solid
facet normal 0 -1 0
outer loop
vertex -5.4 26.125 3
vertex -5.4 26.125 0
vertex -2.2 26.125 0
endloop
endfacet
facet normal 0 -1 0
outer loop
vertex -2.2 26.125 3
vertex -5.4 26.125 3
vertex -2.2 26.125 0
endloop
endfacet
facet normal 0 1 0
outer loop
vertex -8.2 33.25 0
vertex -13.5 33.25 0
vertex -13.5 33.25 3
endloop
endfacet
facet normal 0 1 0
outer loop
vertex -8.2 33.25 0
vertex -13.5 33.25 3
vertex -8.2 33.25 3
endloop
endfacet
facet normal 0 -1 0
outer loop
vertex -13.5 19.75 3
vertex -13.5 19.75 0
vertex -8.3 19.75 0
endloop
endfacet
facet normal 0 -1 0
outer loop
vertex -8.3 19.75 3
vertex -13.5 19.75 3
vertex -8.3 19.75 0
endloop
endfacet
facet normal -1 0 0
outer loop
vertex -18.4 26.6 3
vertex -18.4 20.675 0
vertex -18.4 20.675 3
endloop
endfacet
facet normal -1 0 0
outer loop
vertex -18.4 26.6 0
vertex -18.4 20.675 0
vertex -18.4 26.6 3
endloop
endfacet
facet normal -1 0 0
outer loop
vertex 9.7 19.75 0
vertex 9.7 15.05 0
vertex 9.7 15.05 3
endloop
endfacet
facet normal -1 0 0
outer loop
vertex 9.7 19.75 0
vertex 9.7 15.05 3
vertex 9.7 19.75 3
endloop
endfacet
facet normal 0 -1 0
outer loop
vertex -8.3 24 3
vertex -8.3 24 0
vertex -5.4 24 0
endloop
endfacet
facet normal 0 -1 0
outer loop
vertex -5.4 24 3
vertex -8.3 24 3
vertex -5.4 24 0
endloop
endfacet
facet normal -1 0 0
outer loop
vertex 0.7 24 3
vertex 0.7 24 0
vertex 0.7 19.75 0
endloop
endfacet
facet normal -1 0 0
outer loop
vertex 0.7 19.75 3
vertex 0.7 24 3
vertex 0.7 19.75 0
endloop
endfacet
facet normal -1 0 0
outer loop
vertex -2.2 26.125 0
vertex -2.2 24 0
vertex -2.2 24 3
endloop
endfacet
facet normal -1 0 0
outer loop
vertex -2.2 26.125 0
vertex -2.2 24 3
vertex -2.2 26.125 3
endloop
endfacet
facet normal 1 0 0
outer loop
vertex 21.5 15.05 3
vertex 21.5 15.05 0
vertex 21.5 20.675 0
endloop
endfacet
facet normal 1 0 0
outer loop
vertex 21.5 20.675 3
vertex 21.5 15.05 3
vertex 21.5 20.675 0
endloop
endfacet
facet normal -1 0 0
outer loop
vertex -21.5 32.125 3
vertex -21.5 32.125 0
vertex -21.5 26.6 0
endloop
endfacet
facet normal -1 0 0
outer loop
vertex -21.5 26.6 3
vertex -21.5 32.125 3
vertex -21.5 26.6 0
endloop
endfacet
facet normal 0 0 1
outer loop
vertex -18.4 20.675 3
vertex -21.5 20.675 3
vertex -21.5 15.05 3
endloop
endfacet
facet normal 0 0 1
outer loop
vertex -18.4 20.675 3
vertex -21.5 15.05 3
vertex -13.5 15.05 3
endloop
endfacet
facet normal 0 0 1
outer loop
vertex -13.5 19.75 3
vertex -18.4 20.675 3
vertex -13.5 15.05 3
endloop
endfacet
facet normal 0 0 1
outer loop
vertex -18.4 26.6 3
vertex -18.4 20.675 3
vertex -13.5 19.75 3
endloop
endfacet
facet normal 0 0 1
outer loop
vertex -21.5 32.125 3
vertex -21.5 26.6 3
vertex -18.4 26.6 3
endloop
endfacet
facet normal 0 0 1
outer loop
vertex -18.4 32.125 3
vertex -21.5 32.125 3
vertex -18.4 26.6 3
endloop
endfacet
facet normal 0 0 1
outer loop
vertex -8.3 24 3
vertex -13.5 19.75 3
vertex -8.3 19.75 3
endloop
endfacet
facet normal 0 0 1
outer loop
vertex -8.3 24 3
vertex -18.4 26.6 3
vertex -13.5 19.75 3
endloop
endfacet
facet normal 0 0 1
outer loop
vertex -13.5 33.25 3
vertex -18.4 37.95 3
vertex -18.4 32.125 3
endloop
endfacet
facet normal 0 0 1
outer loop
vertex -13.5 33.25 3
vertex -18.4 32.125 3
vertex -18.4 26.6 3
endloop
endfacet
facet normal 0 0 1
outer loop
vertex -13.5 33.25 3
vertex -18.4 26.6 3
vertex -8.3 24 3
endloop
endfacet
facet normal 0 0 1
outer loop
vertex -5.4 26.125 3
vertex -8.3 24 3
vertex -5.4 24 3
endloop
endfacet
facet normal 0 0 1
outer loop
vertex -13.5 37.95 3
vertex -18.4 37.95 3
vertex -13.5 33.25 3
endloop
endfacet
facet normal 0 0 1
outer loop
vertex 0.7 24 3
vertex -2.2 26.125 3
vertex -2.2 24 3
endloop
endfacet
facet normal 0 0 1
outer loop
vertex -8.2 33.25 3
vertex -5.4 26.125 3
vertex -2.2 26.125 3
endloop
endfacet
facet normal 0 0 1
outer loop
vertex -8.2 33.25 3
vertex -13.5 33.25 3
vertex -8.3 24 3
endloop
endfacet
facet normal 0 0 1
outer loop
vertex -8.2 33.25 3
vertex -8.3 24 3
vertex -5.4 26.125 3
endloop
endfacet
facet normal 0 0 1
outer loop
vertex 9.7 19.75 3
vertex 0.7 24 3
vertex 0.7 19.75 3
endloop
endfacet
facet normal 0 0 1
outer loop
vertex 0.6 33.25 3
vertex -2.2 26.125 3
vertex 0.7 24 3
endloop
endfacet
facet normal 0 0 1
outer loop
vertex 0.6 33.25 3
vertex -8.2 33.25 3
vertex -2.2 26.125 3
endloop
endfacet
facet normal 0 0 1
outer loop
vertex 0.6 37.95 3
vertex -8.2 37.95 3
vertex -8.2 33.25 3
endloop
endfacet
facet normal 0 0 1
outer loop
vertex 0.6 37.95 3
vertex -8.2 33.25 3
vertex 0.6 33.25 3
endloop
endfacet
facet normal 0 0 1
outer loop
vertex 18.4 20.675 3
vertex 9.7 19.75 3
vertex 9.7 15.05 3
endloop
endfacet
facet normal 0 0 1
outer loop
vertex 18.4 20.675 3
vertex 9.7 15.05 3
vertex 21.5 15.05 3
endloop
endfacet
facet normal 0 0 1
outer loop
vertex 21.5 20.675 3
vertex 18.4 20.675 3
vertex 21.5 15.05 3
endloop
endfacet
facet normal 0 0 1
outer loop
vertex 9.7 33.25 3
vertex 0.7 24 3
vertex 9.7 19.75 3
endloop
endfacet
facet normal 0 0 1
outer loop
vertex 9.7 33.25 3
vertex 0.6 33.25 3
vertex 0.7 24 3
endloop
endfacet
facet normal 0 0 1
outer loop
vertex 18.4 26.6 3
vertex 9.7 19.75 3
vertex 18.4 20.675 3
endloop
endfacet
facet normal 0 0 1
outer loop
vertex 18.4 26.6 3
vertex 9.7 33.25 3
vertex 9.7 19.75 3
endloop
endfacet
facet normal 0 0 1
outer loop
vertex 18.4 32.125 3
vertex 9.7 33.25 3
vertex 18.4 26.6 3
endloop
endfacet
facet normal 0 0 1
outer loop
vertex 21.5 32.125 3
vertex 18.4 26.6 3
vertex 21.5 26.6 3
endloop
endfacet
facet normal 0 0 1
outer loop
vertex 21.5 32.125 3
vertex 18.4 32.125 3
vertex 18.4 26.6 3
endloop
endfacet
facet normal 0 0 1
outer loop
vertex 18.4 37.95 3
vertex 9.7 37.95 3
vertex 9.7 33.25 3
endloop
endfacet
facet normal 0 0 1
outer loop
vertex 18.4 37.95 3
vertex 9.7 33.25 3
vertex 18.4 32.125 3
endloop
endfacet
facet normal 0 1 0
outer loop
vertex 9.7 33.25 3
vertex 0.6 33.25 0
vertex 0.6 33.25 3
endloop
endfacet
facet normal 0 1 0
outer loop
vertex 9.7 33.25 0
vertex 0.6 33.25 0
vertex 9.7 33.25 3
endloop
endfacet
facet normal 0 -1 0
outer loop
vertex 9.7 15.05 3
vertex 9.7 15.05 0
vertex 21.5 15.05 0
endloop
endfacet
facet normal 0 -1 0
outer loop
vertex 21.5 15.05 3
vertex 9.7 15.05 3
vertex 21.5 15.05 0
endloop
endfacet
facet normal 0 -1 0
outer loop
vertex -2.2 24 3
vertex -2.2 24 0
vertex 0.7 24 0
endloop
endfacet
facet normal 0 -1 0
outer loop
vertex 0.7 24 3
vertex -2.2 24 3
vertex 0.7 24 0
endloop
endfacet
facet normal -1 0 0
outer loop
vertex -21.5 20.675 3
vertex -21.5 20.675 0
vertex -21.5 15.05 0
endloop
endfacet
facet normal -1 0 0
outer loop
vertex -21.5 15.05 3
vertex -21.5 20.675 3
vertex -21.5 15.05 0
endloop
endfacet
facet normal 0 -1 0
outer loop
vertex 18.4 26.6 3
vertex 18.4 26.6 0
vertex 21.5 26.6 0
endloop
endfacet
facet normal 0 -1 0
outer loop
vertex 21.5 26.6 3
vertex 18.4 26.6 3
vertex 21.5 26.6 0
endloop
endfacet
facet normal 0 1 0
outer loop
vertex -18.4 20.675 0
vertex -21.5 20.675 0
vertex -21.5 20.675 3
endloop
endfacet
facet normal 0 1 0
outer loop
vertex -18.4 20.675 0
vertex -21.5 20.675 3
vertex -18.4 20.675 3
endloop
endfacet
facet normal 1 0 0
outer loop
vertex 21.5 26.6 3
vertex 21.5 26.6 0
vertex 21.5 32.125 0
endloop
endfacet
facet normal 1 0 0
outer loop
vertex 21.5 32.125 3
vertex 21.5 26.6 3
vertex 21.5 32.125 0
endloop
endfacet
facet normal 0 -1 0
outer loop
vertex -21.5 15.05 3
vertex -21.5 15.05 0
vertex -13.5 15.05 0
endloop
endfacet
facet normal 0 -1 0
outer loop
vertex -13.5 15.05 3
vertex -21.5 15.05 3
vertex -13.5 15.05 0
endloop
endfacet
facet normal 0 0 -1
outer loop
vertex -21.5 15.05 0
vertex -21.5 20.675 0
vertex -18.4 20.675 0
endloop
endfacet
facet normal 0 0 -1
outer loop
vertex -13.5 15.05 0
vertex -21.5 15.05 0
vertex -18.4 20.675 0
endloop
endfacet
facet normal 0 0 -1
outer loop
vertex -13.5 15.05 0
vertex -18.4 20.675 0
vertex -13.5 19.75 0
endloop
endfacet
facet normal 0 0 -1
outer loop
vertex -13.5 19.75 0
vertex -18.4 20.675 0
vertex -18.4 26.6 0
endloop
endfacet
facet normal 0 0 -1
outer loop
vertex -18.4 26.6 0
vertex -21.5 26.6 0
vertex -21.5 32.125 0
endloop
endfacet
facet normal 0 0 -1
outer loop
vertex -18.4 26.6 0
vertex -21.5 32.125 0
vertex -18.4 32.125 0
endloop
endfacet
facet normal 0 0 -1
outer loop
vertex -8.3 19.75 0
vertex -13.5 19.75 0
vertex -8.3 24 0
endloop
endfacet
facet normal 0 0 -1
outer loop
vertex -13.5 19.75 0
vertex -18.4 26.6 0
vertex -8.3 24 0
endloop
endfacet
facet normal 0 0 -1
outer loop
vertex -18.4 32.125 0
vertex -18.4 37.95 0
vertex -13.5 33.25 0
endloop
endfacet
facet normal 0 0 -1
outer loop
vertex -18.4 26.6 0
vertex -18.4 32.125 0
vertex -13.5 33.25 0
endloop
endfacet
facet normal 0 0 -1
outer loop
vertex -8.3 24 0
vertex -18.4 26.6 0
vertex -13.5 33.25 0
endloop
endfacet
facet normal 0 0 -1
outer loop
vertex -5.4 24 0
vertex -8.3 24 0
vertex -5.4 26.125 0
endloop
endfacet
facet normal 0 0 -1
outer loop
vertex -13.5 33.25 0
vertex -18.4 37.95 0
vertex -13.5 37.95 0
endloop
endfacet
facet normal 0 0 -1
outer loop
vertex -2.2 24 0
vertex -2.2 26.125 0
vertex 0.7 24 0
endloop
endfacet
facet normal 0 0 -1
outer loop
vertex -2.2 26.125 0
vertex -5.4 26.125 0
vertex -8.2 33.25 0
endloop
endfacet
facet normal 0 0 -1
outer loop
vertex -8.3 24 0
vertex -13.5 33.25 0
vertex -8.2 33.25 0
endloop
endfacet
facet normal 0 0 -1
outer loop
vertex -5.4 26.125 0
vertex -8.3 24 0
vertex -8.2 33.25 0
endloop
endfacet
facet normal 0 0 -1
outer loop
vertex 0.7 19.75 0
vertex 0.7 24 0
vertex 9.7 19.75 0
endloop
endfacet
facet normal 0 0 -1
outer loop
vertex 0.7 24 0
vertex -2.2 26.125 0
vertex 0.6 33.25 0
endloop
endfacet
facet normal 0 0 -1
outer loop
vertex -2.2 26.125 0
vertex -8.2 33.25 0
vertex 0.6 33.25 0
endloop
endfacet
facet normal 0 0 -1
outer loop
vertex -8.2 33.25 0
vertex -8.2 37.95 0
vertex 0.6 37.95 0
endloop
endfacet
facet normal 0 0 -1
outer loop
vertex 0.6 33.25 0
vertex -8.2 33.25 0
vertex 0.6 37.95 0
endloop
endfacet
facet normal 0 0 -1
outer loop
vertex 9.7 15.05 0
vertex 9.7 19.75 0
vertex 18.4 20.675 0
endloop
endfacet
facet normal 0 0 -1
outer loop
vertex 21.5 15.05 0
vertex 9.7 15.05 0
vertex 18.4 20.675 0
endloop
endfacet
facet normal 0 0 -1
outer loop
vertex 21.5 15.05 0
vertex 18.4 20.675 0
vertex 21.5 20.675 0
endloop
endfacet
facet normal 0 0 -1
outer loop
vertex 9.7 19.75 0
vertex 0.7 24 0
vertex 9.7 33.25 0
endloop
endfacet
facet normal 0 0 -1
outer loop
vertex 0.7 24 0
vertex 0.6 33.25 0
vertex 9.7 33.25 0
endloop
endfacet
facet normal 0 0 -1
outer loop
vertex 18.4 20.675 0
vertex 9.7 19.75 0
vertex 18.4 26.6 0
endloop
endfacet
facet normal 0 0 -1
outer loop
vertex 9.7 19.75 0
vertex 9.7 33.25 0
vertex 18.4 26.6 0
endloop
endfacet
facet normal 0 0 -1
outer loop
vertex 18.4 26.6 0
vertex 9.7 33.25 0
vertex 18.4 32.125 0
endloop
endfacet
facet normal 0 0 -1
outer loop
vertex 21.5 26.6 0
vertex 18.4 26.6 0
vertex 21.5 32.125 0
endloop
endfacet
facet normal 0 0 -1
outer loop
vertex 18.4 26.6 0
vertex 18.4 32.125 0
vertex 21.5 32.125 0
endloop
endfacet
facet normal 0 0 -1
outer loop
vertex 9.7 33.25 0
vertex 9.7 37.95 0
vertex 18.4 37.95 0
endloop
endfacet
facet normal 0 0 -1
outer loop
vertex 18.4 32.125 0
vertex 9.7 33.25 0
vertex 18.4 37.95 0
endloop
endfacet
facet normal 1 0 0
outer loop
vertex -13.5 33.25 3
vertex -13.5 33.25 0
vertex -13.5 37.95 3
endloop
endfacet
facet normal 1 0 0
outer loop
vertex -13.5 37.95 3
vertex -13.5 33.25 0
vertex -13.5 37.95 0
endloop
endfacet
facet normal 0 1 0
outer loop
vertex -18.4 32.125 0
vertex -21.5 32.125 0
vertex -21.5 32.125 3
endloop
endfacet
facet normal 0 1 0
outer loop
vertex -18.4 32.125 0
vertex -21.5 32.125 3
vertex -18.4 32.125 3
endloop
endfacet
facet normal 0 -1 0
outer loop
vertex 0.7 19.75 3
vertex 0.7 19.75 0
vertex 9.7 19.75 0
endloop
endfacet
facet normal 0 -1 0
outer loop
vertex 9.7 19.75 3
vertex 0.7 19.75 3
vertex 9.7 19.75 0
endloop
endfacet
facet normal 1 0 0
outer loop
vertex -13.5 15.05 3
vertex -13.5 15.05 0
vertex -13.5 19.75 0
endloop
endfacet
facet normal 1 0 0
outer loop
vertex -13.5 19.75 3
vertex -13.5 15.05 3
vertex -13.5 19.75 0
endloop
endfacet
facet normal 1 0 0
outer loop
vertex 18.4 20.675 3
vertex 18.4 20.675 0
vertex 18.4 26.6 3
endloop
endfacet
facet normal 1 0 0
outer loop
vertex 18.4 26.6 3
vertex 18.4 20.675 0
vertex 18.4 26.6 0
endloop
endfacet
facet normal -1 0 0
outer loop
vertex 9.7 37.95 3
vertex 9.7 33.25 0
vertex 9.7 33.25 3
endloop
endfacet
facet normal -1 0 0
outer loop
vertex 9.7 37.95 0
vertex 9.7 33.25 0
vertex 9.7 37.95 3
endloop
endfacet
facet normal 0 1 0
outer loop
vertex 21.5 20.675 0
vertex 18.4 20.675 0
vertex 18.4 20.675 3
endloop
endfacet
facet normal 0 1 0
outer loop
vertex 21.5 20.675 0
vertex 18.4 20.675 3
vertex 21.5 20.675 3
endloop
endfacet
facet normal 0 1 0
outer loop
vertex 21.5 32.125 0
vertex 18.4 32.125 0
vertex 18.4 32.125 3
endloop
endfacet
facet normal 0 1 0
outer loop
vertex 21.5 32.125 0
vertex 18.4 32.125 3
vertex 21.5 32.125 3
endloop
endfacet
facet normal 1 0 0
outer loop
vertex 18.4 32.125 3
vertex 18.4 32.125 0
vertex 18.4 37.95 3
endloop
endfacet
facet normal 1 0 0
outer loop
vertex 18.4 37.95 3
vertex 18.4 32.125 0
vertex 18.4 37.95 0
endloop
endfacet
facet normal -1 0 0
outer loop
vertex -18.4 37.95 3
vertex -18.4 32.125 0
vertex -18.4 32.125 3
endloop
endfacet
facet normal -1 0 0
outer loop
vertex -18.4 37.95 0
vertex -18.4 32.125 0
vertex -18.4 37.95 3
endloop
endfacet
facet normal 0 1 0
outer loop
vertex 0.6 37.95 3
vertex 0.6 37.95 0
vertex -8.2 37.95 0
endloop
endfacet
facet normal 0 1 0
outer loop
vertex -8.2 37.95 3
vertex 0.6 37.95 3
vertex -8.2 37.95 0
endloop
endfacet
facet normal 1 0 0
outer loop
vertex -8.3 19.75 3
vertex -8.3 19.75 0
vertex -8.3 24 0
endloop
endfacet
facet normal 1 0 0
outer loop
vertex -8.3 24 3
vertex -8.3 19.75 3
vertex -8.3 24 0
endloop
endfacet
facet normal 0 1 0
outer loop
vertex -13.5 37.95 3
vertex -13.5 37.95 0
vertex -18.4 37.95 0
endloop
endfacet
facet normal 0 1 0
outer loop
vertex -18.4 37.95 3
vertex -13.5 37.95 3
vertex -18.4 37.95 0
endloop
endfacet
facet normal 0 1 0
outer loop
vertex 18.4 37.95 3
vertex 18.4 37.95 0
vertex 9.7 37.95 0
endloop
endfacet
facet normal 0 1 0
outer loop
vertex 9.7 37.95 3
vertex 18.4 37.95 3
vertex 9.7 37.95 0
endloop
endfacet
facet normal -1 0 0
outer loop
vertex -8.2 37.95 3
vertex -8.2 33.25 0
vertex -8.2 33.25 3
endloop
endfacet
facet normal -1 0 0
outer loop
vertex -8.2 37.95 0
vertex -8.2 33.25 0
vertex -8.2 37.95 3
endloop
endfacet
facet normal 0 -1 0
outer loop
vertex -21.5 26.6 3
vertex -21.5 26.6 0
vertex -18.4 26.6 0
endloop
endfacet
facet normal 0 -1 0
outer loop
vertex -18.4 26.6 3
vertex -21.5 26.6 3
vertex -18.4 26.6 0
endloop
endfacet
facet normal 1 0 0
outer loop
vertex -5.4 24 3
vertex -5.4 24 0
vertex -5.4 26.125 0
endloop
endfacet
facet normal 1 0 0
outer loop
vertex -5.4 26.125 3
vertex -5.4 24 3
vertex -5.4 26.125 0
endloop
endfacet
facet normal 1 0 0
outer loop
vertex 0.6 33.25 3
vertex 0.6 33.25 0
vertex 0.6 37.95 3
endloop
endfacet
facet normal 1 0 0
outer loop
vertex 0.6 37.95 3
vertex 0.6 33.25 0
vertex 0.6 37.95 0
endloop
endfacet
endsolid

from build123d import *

# Parameters (mm, degrees)
BOSS_EXTRUDE1_DEPTH = 3
SKETCH4_W           = 3.2
SKETCH4_H           = 5.925
SKETCH4_W_2         = 23.2
SKETCH4_H_2         = 4.8
SKETCH4_W_3         = 9.1
SKETCH4_W_4         = 5.3
SKETCH4_H_3         = 2.225
CUT_EXTRUDE2_DEPTH  = 4


with BuildPart() as part:
    # Sketch1 → Boss-Extrude1 (new body)
    with BuildSketch(Plane.XY):
        Polygon((21.5, 37.95), (-21.5, 37.95), (-21.5, 15.05), (-8.3, 15.05), (-8.3, 24), (0.7, 24), (0.7, 15.05), (21.5, 15.05), align=None)
    extrude(amount=BOSS_EXTRUDE1_DEPTH)

    # Sketch4 → Cut-Extrude2 (cut, through all)
    with BuildSketch(Plane.XY):
        with Locations((20, 23.6375)):
            Rectangle(SKETCH4_W, SKETCH4_H)
        with Locations((20, 35.0875)):
            Rectangle(SKETCH4_W, SKETCH4_H)
        with Locations((-1.9, 17.35)):
            Rectangle(SKETCH4_W_2, SKETCH4_H_2)
        with Locations((5.15, 35.65)):
            Rectangle(SKETCH4_W_3, SKETCH4_H_2)
        with Locations((-20, 23.6375)):
            Rectangle(SKETCH4_W, SKETCH4_H)
        with Locations((-20, 35.0875)):
            Rectangle(SKETCH4_W, SKETCH4_H)
        with Locations((-10.85, 35.65)):
            Rectangle(SKETCH4_W_4, SKETCH4_H_2)
        with Locations((-3.8, 25.0125)):
            Rectangle(SKETCH4_W, SKETCH4_H_3)
    extrude(amount=CUT_EXTRUDE2_DEPTH, mode=Mode.SUBTRACT)


solid = part.part
